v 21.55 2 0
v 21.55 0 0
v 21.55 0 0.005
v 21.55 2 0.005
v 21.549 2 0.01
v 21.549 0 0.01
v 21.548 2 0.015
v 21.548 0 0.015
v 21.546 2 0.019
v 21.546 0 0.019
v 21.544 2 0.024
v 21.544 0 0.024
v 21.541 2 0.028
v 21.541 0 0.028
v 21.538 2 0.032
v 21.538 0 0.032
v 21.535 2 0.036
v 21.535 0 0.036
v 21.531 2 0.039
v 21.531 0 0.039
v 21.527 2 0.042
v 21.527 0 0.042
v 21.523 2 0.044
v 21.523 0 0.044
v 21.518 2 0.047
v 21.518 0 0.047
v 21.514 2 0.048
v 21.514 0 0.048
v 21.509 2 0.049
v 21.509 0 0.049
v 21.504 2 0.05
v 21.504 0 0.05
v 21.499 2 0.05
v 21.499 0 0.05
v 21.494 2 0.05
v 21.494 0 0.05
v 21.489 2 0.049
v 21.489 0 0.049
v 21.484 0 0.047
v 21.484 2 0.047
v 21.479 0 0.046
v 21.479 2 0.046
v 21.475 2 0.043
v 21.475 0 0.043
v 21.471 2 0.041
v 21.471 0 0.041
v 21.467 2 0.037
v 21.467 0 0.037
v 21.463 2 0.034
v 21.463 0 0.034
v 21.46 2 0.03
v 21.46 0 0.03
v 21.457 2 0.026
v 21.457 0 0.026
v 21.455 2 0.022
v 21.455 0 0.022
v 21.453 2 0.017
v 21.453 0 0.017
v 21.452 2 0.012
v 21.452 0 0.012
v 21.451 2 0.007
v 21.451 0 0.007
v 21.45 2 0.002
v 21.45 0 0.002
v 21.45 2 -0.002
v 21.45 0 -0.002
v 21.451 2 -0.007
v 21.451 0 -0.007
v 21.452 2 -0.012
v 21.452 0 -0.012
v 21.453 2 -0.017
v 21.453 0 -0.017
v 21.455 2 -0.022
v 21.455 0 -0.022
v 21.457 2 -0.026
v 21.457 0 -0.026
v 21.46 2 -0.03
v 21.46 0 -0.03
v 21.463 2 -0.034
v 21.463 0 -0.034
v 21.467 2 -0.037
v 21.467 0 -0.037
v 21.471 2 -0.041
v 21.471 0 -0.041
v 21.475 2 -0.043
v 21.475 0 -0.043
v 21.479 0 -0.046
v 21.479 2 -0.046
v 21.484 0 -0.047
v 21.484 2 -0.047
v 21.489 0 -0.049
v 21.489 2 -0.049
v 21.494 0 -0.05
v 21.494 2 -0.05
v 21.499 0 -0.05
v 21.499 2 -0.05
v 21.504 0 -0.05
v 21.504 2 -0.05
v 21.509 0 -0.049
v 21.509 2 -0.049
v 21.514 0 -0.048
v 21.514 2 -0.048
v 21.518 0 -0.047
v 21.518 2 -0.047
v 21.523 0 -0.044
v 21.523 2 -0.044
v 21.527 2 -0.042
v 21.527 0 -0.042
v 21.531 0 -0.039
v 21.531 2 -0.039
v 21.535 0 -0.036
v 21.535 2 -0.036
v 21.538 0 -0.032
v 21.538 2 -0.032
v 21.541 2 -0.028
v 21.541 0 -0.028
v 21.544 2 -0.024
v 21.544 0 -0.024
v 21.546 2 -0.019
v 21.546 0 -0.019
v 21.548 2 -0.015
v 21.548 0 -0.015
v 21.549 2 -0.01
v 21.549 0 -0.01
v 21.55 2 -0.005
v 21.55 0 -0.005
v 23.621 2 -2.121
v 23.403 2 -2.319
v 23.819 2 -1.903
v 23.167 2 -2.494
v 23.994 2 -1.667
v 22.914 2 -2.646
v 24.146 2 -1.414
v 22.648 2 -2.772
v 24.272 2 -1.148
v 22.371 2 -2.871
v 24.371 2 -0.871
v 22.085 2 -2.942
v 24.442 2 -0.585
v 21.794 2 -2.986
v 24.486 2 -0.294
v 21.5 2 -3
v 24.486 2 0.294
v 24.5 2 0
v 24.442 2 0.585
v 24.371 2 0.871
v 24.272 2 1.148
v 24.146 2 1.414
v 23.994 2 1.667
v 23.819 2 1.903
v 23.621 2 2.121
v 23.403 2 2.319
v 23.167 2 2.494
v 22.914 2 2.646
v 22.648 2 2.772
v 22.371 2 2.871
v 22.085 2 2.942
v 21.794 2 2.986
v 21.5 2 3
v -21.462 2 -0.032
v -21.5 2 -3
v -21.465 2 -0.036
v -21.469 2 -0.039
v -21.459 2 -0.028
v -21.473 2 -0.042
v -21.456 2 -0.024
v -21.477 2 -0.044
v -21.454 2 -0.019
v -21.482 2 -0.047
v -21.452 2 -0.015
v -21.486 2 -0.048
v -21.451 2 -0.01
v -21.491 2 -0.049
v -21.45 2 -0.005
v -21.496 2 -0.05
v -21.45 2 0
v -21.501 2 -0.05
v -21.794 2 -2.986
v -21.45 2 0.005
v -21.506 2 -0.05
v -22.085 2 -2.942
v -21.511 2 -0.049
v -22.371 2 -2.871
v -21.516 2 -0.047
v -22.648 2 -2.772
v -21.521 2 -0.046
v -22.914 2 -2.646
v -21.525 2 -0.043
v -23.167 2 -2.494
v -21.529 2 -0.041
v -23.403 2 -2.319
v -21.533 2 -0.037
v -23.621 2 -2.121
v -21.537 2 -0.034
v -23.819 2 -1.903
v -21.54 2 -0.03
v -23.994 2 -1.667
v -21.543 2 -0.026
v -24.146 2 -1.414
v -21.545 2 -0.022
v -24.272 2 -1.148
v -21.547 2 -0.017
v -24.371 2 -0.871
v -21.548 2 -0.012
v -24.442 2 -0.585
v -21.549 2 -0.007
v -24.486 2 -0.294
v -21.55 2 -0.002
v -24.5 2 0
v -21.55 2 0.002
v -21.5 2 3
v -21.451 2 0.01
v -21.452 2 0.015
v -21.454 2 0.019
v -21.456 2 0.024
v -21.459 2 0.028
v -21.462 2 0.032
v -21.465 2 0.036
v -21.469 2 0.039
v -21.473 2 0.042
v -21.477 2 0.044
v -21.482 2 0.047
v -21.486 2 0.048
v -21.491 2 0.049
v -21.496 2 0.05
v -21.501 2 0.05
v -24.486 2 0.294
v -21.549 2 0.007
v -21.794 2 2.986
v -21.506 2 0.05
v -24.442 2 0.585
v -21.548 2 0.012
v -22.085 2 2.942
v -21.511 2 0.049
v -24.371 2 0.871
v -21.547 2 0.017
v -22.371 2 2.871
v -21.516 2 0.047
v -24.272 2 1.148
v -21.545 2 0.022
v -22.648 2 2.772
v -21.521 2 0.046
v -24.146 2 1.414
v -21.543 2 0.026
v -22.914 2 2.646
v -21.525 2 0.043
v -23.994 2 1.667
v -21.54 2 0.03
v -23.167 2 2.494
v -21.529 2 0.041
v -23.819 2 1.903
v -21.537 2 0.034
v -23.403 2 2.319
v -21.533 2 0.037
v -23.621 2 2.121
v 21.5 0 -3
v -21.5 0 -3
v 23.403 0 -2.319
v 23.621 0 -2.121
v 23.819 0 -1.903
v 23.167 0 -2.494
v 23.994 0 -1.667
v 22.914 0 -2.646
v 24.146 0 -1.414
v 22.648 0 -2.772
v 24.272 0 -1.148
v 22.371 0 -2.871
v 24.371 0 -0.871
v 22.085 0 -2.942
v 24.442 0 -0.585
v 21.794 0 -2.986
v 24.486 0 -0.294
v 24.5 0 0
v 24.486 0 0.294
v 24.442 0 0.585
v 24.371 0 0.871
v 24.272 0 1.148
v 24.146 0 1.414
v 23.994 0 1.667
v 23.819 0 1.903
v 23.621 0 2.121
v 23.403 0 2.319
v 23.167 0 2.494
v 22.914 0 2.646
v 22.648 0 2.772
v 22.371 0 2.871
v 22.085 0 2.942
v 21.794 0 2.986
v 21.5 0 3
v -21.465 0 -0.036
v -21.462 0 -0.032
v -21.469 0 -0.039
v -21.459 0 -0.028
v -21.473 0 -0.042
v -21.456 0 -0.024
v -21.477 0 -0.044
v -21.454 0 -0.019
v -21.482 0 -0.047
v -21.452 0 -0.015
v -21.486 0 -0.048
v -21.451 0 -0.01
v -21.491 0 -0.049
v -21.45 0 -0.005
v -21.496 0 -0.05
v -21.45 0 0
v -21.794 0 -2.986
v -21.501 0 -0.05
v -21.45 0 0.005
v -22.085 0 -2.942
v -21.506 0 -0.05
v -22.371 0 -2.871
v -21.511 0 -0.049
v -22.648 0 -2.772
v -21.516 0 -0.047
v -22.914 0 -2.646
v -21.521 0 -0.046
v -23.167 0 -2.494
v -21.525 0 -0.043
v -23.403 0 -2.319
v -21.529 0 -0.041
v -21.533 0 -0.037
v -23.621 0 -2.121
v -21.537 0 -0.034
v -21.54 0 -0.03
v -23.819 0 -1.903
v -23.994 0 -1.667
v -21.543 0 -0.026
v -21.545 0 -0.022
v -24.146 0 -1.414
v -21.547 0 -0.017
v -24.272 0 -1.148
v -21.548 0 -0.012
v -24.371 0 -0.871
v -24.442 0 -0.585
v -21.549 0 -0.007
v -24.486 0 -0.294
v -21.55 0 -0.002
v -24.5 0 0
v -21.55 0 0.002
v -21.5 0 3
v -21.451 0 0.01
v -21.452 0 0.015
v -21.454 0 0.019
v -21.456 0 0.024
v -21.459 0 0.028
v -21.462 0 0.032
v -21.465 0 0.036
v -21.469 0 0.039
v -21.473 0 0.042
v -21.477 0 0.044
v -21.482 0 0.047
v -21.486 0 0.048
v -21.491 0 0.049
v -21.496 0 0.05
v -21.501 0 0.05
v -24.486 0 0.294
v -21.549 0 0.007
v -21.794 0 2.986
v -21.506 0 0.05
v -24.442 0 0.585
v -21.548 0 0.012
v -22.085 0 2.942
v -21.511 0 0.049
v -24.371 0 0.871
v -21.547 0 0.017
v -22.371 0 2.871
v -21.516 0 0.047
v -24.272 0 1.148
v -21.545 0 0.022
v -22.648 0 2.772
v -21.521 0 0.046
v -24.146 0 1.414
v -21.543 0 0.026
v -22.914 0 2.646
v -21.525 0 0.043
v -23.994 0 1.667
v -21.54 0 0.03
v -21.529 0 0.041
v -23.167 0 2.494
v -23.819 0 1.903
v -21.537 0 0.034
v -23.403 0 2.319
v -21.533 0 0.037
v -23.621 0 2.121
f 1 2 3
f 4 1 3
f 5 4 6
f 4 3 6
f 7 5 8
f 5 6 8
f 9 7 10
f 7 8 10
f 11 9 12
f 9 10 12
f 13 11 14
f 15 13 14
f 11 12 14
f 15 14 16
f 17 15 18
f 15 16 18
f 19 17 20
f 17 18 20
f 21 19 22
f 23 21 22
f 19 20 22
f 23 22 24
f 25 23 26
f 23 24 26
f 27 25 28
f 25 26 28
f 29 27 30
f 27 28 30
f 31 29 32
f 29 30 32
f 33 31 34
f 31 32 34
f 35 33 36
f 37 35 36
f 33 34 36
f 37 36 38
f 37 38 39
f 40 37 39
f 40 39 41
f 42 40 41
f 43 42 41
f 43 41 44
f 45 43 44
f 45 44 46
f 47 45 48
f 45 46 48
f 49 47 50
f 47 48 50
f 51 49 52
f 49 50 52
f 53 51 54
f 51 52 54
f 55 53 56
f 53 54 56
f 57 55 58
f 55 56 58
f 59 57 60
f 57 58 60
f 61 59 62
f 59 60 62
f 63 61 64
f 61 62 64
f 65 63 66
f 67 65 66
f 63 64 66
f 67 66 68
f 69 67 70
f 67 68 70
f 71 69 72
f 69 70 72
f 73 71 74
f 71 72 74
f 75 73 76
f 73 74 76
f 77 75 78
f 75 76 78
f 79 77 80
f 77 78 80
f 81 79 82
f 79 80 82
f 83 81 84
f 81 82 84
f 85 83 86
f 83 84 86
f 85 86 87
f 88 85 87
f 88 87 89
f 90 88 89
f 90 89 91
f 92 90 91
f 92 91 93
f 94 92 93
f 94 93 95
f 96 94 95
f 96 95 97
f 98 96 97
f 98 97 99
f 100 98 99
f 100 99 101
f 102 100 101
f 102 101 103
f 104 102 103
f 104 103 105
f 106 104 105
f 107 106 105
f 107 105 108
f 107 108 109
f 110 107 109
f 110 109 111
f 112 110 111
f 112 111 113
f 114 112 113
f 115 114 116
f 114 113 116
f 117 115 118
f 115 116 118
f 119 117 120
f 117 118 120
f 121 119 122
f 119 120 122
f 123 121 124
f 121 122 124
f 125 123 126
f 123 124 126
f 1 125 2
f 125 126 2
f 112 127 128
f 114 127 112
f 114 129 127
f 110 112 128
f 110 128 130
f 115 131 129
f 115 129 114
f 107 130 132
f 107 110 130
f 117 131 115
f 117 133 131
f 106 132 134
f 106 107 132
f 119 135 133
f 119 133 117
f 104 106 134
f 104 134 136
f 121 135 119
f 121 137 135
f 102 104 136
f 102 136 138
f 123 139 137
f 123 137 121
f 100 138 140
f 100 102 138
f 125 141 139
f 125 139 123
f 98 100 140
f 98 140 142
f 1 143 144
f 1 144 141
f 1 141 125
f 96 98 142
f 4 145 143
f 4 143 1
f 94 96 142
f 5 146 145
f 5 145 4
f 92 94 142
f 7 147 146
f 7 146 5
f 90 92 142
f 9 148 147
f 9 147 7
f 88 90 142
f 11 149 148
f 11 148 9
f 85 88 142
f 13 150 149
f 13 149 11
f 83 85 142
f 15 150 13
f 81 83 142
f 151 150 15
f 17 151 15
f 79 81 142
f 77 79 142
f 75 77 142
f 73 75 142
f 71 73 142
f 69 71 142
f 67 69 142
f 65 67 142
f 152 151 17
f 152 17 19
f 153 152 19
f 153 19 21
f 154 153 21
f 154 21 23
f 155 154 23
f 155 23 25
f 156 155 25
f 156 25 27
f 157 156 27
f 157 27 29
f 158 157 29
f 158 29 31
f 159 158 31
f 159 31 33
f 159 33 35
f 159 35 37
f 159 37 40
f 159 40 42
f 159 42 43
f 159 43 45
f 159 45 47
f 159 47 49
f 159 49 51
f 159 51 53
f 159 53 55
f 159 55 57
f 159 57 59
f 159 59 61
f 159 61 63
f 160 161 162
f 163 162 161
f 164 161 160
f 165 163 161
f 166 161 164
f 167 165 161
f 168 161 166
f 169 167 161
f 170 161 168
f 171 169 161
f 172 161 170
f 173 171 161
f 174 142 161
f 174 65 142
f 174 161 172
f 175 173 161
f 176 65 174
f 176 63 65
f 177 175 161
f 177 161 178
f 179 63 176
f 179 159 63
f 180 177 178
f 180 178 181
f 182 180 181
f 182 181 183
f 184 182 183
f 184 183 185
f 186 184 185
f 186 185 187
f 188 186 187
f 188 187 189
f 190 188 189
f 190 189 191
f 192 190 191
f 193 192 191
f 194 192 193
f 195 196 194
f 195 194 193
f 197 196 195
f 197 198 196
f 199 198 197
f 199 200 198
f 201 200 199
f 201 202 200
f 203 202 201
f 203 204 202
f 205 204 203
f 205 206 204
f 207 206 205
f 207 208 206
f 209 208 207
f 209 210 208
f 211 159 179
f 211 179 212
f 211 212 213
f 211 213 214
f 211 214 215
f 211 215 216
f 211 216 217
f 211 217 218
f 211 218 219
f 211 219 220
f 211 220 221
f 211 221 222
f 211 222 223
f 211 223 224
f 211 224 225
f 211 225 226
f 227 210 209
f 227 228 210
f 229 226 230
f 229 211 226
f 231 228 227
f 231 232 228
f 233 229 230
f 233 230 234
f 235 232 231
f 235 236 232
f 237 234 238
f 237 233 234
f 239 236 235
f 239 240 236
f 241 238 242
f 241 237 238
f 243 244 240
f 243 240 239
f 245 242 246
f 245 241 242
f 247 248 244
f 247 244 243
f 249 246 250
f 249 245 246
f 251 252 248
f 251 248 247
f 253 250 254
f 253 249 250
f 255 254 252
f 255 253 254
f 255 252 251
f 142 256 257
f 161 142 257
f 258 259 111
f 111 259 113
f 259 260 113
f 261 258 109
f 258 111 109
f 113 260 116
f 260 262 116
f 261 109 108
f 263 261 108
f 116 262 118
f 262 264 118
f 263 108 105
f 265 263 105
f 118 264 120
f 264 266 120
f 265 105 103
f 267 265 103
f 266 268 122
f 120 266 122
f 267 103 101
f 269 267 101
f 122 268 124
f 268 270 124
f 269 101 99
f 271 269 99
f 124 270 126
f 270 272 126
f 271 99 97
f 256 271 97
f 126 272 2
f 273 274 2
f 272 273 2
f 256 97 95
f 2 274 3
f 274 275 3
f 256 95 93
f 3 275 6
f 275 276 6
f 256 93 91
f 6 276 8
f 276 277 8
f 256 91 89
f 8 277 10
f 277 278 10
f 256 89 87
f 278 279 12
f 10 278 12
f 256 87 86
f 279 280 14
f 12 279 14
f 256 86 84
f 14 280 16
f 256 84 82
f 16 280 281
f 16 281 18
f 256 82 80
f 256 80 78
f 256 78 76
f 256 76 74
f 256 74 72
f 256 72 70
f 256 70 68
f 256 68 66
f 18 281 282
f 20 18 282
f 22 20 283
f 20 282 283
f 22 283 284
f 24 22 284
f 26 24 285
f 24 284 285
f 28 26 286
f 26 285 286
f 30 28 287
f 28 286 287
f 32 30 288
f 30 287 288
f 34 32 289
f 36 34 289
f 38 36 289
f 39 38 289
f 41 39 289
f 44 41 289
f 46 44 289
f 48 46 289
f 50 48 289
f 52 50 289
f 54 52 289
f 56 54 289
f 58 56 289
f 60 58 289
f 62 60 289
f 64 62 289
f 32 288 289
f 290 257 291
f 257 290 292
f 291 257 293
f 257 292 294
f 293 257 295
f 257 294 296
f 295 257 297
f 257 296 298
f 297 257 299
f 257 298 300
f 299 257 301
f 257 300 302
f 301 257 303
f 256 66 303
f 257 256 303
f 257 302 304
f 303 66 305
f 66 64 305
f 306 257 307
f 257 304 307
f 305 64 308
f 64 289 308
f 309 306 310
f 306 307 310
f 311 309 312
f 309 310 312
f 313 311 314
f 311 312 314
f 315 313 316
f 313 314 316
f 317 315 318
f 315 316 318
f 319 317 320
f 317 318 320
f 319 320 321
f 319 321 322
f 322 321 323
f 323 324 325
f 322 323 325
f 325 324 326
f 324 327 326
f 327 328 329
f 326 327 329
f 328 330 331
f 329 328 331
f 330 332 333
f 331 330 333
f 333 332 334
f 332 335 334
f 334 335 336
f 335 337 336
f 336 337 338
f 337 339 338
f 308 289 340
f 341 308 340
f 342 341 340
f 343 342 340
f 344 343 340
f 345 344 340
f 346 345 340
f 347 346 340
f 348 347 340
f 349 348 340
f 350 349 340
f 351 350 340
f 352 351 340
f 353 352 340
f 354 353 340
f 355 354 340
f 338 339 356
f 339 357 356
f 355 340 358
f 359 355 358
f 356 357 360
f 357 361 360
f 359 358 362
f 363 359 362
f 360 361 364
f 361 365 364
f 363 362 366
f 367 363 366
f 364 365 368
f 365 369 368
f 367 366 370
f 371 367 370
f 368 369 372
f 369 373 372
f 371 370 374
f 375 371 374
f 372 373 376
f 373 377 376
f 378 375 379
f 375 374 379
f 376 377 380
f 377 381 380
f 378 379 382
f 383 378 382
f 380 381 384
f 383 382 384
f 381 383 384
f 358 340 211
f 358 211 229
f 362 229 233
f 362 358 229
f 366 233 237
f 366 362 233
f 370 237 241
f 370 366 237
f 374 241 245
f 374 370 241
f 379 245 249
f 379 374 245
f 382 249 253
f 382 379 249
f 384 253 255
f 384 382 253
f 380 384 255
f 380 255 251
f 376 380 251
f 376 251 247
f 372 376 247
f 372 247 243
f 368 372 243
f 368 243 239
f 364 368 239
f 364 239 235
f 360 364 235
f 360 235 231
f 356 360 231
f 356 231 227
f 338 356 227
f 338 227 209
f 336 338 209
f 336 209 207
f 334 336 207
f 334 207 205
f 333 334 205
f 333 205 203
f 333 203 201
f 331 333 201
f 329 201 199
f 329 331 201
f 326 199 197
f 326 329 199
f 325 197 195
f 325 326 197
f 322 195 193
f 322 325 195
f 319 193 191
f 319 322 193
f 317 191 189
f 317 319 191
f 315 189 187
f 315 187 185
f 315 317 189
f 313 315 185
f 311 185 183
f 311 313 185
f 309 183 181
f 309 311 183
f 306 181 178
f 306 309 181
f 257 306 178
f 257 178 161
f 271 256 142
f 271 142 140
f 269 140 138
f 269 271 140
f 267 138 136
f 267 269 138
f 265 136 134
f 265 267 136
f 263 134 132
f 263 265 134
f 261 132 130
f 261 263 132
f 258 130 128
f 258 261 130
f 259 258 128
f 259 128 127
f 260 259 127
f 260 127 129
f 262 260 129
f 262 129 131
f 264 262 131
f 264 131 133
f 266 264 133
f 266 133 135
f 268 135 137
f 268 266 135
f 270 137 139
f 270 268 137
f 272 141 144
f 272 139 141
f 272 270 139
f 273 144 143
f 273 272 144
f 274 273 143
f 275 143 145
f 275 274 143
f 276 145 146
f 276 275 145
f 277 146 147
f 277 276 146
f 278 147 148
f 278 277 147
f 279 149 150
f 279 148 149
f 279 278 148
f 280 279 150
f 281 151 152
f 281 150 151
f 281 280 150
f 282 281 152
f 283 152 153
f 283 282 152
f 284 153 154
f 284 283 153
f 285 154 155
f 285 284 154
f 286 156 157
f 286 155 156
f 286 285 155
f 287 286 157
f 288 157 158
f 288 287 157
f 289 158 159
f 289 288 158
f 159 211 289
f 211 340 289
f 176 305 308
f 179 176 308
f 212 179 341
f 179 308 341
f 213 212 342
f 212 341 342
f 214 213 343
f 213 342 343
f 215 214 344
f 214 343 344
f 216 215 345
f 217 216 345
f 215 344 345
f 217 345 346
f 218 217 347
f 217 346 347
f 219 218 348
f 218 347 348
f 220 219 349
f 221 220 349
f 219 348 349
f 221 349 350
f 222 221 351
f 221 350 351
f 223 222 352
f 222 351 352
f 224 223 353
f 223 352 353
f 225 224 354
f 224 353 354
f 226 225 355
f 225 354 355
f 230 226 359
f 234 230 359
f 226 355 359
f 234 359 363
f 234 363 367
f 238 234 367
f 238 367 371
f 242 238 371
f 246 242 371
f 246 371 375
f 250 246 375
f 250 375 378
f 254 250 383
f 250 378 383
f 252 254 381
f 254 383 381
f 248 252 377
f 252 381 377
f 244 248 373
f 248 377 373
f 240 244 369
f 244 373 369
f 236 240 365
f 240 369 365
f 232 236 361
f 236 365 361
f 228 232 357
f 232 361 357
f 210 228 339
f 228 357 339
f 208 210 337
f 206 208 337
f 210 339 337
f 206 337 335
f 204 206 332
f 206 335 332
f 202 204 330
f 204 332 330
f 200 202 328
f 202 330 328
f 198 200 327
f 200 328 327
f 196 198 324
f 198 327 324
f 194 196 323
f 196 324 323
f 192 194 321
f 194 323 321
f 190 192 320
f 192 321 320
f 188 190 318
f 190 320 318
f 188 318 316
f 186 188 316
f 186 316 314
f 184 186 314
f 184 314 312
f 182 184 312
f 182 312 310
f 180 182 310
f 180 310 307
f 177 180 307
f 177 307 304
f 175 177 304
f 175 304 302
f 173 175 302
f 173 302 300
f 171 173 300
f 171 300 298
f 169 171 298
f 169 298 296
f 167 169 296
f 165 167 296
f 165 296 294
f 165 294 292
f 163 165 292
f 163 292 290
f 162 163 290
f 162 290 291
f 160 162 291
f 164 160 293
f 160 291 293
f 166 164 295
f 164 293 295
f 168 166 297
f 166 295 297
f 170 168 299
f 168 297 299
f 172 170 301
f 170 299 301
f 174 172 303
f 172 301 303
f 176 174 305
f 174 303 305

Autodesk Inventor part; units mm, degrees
ref_plane "YZ Plane" through (0, 0, 0) normal (1, 0, 0) x (0, 1, 0)
ref_plane "XZ Plane" through (0, 0, 0) normal (0, 1, 0) x (-1, 0, 0)
ref_plane "XY Plane" through (0, 0, 0) normal (0, 0, 1) x (1, 0, 0)
sketch "Sketch1" plane through (0, 0, 0) normal (0, 1, 0) x (-1, 0, 0)
  line L0 (-21.5, -3) -> (21.5, -3)
  line L1 (21.5, -3) -> (21.5, 3)
  line L2 (21.5, 3) -> (-21.5, 3)
  line L3 (-21.5, 3) -> (-21.5, -3)
  line L4 (-21.5, -3) -> (21.5, 3) construction
  line L5 (21.5, -3) -> (-21.5, 3) construction
  circle A0 centre (21.5, 0) radius 3
  circle A1 centre (-21.5, 0) radius 3
  point P0 (0, 0)
  dimension "d0" = 43
  dimension "d1" = 6
extrude "Extrusion1" add sketch "Sketch1" along normal blind 2
sketch "Sketch2" plane through (0, 2, 0) normal (0, 1, 0) x (1, 0, 0)
  arc A0 (21.5, -3) -> (21.5, 3) centre (21.5, 0) ccw projected
  arc A1 (-21.5, 3) -> (-21.5, -3) centre (-21.5, 0) ccw projected
  circle A2 centre (-21.5, 0) radius 1.5
  circle A3 centre (21.5, 0) radius 1.5
  point P0 (0, 0)
  dimension "d5" = 3
  dimension "d6" = 3
extrude "Extrusion2" cut sketch "Sketch2" against normal blind 2
sketch "Sketch3" plane through (0, 0, 0) normal (0, -1, 0) x (1, 0, 0)
  circle A0 centre (-21.5, 0) radius 1.5 projected
  circle A1 centre (21.5, 0) radius 1.5 projected
  arc A2 (21.5, -3) -> (21.5, 3) centre (21.5, 0) ccw projected
  arc A3 (-21.5, 3) -> (-21.5, -3) centre (-21.5, 0) ccw projected
  circle A4 centre (-21.5, 0) radius 0.05
  circle A5 centre (21.5, 0) radius 0.05
  point P0 (0, 0)
  dimension "d9" = 0.1
  dimension "d10" = 0.1
extrude "Extrusion3" add sketch "Sketch3" against normal blind 2
properties part number "tahlo7,sablona"
